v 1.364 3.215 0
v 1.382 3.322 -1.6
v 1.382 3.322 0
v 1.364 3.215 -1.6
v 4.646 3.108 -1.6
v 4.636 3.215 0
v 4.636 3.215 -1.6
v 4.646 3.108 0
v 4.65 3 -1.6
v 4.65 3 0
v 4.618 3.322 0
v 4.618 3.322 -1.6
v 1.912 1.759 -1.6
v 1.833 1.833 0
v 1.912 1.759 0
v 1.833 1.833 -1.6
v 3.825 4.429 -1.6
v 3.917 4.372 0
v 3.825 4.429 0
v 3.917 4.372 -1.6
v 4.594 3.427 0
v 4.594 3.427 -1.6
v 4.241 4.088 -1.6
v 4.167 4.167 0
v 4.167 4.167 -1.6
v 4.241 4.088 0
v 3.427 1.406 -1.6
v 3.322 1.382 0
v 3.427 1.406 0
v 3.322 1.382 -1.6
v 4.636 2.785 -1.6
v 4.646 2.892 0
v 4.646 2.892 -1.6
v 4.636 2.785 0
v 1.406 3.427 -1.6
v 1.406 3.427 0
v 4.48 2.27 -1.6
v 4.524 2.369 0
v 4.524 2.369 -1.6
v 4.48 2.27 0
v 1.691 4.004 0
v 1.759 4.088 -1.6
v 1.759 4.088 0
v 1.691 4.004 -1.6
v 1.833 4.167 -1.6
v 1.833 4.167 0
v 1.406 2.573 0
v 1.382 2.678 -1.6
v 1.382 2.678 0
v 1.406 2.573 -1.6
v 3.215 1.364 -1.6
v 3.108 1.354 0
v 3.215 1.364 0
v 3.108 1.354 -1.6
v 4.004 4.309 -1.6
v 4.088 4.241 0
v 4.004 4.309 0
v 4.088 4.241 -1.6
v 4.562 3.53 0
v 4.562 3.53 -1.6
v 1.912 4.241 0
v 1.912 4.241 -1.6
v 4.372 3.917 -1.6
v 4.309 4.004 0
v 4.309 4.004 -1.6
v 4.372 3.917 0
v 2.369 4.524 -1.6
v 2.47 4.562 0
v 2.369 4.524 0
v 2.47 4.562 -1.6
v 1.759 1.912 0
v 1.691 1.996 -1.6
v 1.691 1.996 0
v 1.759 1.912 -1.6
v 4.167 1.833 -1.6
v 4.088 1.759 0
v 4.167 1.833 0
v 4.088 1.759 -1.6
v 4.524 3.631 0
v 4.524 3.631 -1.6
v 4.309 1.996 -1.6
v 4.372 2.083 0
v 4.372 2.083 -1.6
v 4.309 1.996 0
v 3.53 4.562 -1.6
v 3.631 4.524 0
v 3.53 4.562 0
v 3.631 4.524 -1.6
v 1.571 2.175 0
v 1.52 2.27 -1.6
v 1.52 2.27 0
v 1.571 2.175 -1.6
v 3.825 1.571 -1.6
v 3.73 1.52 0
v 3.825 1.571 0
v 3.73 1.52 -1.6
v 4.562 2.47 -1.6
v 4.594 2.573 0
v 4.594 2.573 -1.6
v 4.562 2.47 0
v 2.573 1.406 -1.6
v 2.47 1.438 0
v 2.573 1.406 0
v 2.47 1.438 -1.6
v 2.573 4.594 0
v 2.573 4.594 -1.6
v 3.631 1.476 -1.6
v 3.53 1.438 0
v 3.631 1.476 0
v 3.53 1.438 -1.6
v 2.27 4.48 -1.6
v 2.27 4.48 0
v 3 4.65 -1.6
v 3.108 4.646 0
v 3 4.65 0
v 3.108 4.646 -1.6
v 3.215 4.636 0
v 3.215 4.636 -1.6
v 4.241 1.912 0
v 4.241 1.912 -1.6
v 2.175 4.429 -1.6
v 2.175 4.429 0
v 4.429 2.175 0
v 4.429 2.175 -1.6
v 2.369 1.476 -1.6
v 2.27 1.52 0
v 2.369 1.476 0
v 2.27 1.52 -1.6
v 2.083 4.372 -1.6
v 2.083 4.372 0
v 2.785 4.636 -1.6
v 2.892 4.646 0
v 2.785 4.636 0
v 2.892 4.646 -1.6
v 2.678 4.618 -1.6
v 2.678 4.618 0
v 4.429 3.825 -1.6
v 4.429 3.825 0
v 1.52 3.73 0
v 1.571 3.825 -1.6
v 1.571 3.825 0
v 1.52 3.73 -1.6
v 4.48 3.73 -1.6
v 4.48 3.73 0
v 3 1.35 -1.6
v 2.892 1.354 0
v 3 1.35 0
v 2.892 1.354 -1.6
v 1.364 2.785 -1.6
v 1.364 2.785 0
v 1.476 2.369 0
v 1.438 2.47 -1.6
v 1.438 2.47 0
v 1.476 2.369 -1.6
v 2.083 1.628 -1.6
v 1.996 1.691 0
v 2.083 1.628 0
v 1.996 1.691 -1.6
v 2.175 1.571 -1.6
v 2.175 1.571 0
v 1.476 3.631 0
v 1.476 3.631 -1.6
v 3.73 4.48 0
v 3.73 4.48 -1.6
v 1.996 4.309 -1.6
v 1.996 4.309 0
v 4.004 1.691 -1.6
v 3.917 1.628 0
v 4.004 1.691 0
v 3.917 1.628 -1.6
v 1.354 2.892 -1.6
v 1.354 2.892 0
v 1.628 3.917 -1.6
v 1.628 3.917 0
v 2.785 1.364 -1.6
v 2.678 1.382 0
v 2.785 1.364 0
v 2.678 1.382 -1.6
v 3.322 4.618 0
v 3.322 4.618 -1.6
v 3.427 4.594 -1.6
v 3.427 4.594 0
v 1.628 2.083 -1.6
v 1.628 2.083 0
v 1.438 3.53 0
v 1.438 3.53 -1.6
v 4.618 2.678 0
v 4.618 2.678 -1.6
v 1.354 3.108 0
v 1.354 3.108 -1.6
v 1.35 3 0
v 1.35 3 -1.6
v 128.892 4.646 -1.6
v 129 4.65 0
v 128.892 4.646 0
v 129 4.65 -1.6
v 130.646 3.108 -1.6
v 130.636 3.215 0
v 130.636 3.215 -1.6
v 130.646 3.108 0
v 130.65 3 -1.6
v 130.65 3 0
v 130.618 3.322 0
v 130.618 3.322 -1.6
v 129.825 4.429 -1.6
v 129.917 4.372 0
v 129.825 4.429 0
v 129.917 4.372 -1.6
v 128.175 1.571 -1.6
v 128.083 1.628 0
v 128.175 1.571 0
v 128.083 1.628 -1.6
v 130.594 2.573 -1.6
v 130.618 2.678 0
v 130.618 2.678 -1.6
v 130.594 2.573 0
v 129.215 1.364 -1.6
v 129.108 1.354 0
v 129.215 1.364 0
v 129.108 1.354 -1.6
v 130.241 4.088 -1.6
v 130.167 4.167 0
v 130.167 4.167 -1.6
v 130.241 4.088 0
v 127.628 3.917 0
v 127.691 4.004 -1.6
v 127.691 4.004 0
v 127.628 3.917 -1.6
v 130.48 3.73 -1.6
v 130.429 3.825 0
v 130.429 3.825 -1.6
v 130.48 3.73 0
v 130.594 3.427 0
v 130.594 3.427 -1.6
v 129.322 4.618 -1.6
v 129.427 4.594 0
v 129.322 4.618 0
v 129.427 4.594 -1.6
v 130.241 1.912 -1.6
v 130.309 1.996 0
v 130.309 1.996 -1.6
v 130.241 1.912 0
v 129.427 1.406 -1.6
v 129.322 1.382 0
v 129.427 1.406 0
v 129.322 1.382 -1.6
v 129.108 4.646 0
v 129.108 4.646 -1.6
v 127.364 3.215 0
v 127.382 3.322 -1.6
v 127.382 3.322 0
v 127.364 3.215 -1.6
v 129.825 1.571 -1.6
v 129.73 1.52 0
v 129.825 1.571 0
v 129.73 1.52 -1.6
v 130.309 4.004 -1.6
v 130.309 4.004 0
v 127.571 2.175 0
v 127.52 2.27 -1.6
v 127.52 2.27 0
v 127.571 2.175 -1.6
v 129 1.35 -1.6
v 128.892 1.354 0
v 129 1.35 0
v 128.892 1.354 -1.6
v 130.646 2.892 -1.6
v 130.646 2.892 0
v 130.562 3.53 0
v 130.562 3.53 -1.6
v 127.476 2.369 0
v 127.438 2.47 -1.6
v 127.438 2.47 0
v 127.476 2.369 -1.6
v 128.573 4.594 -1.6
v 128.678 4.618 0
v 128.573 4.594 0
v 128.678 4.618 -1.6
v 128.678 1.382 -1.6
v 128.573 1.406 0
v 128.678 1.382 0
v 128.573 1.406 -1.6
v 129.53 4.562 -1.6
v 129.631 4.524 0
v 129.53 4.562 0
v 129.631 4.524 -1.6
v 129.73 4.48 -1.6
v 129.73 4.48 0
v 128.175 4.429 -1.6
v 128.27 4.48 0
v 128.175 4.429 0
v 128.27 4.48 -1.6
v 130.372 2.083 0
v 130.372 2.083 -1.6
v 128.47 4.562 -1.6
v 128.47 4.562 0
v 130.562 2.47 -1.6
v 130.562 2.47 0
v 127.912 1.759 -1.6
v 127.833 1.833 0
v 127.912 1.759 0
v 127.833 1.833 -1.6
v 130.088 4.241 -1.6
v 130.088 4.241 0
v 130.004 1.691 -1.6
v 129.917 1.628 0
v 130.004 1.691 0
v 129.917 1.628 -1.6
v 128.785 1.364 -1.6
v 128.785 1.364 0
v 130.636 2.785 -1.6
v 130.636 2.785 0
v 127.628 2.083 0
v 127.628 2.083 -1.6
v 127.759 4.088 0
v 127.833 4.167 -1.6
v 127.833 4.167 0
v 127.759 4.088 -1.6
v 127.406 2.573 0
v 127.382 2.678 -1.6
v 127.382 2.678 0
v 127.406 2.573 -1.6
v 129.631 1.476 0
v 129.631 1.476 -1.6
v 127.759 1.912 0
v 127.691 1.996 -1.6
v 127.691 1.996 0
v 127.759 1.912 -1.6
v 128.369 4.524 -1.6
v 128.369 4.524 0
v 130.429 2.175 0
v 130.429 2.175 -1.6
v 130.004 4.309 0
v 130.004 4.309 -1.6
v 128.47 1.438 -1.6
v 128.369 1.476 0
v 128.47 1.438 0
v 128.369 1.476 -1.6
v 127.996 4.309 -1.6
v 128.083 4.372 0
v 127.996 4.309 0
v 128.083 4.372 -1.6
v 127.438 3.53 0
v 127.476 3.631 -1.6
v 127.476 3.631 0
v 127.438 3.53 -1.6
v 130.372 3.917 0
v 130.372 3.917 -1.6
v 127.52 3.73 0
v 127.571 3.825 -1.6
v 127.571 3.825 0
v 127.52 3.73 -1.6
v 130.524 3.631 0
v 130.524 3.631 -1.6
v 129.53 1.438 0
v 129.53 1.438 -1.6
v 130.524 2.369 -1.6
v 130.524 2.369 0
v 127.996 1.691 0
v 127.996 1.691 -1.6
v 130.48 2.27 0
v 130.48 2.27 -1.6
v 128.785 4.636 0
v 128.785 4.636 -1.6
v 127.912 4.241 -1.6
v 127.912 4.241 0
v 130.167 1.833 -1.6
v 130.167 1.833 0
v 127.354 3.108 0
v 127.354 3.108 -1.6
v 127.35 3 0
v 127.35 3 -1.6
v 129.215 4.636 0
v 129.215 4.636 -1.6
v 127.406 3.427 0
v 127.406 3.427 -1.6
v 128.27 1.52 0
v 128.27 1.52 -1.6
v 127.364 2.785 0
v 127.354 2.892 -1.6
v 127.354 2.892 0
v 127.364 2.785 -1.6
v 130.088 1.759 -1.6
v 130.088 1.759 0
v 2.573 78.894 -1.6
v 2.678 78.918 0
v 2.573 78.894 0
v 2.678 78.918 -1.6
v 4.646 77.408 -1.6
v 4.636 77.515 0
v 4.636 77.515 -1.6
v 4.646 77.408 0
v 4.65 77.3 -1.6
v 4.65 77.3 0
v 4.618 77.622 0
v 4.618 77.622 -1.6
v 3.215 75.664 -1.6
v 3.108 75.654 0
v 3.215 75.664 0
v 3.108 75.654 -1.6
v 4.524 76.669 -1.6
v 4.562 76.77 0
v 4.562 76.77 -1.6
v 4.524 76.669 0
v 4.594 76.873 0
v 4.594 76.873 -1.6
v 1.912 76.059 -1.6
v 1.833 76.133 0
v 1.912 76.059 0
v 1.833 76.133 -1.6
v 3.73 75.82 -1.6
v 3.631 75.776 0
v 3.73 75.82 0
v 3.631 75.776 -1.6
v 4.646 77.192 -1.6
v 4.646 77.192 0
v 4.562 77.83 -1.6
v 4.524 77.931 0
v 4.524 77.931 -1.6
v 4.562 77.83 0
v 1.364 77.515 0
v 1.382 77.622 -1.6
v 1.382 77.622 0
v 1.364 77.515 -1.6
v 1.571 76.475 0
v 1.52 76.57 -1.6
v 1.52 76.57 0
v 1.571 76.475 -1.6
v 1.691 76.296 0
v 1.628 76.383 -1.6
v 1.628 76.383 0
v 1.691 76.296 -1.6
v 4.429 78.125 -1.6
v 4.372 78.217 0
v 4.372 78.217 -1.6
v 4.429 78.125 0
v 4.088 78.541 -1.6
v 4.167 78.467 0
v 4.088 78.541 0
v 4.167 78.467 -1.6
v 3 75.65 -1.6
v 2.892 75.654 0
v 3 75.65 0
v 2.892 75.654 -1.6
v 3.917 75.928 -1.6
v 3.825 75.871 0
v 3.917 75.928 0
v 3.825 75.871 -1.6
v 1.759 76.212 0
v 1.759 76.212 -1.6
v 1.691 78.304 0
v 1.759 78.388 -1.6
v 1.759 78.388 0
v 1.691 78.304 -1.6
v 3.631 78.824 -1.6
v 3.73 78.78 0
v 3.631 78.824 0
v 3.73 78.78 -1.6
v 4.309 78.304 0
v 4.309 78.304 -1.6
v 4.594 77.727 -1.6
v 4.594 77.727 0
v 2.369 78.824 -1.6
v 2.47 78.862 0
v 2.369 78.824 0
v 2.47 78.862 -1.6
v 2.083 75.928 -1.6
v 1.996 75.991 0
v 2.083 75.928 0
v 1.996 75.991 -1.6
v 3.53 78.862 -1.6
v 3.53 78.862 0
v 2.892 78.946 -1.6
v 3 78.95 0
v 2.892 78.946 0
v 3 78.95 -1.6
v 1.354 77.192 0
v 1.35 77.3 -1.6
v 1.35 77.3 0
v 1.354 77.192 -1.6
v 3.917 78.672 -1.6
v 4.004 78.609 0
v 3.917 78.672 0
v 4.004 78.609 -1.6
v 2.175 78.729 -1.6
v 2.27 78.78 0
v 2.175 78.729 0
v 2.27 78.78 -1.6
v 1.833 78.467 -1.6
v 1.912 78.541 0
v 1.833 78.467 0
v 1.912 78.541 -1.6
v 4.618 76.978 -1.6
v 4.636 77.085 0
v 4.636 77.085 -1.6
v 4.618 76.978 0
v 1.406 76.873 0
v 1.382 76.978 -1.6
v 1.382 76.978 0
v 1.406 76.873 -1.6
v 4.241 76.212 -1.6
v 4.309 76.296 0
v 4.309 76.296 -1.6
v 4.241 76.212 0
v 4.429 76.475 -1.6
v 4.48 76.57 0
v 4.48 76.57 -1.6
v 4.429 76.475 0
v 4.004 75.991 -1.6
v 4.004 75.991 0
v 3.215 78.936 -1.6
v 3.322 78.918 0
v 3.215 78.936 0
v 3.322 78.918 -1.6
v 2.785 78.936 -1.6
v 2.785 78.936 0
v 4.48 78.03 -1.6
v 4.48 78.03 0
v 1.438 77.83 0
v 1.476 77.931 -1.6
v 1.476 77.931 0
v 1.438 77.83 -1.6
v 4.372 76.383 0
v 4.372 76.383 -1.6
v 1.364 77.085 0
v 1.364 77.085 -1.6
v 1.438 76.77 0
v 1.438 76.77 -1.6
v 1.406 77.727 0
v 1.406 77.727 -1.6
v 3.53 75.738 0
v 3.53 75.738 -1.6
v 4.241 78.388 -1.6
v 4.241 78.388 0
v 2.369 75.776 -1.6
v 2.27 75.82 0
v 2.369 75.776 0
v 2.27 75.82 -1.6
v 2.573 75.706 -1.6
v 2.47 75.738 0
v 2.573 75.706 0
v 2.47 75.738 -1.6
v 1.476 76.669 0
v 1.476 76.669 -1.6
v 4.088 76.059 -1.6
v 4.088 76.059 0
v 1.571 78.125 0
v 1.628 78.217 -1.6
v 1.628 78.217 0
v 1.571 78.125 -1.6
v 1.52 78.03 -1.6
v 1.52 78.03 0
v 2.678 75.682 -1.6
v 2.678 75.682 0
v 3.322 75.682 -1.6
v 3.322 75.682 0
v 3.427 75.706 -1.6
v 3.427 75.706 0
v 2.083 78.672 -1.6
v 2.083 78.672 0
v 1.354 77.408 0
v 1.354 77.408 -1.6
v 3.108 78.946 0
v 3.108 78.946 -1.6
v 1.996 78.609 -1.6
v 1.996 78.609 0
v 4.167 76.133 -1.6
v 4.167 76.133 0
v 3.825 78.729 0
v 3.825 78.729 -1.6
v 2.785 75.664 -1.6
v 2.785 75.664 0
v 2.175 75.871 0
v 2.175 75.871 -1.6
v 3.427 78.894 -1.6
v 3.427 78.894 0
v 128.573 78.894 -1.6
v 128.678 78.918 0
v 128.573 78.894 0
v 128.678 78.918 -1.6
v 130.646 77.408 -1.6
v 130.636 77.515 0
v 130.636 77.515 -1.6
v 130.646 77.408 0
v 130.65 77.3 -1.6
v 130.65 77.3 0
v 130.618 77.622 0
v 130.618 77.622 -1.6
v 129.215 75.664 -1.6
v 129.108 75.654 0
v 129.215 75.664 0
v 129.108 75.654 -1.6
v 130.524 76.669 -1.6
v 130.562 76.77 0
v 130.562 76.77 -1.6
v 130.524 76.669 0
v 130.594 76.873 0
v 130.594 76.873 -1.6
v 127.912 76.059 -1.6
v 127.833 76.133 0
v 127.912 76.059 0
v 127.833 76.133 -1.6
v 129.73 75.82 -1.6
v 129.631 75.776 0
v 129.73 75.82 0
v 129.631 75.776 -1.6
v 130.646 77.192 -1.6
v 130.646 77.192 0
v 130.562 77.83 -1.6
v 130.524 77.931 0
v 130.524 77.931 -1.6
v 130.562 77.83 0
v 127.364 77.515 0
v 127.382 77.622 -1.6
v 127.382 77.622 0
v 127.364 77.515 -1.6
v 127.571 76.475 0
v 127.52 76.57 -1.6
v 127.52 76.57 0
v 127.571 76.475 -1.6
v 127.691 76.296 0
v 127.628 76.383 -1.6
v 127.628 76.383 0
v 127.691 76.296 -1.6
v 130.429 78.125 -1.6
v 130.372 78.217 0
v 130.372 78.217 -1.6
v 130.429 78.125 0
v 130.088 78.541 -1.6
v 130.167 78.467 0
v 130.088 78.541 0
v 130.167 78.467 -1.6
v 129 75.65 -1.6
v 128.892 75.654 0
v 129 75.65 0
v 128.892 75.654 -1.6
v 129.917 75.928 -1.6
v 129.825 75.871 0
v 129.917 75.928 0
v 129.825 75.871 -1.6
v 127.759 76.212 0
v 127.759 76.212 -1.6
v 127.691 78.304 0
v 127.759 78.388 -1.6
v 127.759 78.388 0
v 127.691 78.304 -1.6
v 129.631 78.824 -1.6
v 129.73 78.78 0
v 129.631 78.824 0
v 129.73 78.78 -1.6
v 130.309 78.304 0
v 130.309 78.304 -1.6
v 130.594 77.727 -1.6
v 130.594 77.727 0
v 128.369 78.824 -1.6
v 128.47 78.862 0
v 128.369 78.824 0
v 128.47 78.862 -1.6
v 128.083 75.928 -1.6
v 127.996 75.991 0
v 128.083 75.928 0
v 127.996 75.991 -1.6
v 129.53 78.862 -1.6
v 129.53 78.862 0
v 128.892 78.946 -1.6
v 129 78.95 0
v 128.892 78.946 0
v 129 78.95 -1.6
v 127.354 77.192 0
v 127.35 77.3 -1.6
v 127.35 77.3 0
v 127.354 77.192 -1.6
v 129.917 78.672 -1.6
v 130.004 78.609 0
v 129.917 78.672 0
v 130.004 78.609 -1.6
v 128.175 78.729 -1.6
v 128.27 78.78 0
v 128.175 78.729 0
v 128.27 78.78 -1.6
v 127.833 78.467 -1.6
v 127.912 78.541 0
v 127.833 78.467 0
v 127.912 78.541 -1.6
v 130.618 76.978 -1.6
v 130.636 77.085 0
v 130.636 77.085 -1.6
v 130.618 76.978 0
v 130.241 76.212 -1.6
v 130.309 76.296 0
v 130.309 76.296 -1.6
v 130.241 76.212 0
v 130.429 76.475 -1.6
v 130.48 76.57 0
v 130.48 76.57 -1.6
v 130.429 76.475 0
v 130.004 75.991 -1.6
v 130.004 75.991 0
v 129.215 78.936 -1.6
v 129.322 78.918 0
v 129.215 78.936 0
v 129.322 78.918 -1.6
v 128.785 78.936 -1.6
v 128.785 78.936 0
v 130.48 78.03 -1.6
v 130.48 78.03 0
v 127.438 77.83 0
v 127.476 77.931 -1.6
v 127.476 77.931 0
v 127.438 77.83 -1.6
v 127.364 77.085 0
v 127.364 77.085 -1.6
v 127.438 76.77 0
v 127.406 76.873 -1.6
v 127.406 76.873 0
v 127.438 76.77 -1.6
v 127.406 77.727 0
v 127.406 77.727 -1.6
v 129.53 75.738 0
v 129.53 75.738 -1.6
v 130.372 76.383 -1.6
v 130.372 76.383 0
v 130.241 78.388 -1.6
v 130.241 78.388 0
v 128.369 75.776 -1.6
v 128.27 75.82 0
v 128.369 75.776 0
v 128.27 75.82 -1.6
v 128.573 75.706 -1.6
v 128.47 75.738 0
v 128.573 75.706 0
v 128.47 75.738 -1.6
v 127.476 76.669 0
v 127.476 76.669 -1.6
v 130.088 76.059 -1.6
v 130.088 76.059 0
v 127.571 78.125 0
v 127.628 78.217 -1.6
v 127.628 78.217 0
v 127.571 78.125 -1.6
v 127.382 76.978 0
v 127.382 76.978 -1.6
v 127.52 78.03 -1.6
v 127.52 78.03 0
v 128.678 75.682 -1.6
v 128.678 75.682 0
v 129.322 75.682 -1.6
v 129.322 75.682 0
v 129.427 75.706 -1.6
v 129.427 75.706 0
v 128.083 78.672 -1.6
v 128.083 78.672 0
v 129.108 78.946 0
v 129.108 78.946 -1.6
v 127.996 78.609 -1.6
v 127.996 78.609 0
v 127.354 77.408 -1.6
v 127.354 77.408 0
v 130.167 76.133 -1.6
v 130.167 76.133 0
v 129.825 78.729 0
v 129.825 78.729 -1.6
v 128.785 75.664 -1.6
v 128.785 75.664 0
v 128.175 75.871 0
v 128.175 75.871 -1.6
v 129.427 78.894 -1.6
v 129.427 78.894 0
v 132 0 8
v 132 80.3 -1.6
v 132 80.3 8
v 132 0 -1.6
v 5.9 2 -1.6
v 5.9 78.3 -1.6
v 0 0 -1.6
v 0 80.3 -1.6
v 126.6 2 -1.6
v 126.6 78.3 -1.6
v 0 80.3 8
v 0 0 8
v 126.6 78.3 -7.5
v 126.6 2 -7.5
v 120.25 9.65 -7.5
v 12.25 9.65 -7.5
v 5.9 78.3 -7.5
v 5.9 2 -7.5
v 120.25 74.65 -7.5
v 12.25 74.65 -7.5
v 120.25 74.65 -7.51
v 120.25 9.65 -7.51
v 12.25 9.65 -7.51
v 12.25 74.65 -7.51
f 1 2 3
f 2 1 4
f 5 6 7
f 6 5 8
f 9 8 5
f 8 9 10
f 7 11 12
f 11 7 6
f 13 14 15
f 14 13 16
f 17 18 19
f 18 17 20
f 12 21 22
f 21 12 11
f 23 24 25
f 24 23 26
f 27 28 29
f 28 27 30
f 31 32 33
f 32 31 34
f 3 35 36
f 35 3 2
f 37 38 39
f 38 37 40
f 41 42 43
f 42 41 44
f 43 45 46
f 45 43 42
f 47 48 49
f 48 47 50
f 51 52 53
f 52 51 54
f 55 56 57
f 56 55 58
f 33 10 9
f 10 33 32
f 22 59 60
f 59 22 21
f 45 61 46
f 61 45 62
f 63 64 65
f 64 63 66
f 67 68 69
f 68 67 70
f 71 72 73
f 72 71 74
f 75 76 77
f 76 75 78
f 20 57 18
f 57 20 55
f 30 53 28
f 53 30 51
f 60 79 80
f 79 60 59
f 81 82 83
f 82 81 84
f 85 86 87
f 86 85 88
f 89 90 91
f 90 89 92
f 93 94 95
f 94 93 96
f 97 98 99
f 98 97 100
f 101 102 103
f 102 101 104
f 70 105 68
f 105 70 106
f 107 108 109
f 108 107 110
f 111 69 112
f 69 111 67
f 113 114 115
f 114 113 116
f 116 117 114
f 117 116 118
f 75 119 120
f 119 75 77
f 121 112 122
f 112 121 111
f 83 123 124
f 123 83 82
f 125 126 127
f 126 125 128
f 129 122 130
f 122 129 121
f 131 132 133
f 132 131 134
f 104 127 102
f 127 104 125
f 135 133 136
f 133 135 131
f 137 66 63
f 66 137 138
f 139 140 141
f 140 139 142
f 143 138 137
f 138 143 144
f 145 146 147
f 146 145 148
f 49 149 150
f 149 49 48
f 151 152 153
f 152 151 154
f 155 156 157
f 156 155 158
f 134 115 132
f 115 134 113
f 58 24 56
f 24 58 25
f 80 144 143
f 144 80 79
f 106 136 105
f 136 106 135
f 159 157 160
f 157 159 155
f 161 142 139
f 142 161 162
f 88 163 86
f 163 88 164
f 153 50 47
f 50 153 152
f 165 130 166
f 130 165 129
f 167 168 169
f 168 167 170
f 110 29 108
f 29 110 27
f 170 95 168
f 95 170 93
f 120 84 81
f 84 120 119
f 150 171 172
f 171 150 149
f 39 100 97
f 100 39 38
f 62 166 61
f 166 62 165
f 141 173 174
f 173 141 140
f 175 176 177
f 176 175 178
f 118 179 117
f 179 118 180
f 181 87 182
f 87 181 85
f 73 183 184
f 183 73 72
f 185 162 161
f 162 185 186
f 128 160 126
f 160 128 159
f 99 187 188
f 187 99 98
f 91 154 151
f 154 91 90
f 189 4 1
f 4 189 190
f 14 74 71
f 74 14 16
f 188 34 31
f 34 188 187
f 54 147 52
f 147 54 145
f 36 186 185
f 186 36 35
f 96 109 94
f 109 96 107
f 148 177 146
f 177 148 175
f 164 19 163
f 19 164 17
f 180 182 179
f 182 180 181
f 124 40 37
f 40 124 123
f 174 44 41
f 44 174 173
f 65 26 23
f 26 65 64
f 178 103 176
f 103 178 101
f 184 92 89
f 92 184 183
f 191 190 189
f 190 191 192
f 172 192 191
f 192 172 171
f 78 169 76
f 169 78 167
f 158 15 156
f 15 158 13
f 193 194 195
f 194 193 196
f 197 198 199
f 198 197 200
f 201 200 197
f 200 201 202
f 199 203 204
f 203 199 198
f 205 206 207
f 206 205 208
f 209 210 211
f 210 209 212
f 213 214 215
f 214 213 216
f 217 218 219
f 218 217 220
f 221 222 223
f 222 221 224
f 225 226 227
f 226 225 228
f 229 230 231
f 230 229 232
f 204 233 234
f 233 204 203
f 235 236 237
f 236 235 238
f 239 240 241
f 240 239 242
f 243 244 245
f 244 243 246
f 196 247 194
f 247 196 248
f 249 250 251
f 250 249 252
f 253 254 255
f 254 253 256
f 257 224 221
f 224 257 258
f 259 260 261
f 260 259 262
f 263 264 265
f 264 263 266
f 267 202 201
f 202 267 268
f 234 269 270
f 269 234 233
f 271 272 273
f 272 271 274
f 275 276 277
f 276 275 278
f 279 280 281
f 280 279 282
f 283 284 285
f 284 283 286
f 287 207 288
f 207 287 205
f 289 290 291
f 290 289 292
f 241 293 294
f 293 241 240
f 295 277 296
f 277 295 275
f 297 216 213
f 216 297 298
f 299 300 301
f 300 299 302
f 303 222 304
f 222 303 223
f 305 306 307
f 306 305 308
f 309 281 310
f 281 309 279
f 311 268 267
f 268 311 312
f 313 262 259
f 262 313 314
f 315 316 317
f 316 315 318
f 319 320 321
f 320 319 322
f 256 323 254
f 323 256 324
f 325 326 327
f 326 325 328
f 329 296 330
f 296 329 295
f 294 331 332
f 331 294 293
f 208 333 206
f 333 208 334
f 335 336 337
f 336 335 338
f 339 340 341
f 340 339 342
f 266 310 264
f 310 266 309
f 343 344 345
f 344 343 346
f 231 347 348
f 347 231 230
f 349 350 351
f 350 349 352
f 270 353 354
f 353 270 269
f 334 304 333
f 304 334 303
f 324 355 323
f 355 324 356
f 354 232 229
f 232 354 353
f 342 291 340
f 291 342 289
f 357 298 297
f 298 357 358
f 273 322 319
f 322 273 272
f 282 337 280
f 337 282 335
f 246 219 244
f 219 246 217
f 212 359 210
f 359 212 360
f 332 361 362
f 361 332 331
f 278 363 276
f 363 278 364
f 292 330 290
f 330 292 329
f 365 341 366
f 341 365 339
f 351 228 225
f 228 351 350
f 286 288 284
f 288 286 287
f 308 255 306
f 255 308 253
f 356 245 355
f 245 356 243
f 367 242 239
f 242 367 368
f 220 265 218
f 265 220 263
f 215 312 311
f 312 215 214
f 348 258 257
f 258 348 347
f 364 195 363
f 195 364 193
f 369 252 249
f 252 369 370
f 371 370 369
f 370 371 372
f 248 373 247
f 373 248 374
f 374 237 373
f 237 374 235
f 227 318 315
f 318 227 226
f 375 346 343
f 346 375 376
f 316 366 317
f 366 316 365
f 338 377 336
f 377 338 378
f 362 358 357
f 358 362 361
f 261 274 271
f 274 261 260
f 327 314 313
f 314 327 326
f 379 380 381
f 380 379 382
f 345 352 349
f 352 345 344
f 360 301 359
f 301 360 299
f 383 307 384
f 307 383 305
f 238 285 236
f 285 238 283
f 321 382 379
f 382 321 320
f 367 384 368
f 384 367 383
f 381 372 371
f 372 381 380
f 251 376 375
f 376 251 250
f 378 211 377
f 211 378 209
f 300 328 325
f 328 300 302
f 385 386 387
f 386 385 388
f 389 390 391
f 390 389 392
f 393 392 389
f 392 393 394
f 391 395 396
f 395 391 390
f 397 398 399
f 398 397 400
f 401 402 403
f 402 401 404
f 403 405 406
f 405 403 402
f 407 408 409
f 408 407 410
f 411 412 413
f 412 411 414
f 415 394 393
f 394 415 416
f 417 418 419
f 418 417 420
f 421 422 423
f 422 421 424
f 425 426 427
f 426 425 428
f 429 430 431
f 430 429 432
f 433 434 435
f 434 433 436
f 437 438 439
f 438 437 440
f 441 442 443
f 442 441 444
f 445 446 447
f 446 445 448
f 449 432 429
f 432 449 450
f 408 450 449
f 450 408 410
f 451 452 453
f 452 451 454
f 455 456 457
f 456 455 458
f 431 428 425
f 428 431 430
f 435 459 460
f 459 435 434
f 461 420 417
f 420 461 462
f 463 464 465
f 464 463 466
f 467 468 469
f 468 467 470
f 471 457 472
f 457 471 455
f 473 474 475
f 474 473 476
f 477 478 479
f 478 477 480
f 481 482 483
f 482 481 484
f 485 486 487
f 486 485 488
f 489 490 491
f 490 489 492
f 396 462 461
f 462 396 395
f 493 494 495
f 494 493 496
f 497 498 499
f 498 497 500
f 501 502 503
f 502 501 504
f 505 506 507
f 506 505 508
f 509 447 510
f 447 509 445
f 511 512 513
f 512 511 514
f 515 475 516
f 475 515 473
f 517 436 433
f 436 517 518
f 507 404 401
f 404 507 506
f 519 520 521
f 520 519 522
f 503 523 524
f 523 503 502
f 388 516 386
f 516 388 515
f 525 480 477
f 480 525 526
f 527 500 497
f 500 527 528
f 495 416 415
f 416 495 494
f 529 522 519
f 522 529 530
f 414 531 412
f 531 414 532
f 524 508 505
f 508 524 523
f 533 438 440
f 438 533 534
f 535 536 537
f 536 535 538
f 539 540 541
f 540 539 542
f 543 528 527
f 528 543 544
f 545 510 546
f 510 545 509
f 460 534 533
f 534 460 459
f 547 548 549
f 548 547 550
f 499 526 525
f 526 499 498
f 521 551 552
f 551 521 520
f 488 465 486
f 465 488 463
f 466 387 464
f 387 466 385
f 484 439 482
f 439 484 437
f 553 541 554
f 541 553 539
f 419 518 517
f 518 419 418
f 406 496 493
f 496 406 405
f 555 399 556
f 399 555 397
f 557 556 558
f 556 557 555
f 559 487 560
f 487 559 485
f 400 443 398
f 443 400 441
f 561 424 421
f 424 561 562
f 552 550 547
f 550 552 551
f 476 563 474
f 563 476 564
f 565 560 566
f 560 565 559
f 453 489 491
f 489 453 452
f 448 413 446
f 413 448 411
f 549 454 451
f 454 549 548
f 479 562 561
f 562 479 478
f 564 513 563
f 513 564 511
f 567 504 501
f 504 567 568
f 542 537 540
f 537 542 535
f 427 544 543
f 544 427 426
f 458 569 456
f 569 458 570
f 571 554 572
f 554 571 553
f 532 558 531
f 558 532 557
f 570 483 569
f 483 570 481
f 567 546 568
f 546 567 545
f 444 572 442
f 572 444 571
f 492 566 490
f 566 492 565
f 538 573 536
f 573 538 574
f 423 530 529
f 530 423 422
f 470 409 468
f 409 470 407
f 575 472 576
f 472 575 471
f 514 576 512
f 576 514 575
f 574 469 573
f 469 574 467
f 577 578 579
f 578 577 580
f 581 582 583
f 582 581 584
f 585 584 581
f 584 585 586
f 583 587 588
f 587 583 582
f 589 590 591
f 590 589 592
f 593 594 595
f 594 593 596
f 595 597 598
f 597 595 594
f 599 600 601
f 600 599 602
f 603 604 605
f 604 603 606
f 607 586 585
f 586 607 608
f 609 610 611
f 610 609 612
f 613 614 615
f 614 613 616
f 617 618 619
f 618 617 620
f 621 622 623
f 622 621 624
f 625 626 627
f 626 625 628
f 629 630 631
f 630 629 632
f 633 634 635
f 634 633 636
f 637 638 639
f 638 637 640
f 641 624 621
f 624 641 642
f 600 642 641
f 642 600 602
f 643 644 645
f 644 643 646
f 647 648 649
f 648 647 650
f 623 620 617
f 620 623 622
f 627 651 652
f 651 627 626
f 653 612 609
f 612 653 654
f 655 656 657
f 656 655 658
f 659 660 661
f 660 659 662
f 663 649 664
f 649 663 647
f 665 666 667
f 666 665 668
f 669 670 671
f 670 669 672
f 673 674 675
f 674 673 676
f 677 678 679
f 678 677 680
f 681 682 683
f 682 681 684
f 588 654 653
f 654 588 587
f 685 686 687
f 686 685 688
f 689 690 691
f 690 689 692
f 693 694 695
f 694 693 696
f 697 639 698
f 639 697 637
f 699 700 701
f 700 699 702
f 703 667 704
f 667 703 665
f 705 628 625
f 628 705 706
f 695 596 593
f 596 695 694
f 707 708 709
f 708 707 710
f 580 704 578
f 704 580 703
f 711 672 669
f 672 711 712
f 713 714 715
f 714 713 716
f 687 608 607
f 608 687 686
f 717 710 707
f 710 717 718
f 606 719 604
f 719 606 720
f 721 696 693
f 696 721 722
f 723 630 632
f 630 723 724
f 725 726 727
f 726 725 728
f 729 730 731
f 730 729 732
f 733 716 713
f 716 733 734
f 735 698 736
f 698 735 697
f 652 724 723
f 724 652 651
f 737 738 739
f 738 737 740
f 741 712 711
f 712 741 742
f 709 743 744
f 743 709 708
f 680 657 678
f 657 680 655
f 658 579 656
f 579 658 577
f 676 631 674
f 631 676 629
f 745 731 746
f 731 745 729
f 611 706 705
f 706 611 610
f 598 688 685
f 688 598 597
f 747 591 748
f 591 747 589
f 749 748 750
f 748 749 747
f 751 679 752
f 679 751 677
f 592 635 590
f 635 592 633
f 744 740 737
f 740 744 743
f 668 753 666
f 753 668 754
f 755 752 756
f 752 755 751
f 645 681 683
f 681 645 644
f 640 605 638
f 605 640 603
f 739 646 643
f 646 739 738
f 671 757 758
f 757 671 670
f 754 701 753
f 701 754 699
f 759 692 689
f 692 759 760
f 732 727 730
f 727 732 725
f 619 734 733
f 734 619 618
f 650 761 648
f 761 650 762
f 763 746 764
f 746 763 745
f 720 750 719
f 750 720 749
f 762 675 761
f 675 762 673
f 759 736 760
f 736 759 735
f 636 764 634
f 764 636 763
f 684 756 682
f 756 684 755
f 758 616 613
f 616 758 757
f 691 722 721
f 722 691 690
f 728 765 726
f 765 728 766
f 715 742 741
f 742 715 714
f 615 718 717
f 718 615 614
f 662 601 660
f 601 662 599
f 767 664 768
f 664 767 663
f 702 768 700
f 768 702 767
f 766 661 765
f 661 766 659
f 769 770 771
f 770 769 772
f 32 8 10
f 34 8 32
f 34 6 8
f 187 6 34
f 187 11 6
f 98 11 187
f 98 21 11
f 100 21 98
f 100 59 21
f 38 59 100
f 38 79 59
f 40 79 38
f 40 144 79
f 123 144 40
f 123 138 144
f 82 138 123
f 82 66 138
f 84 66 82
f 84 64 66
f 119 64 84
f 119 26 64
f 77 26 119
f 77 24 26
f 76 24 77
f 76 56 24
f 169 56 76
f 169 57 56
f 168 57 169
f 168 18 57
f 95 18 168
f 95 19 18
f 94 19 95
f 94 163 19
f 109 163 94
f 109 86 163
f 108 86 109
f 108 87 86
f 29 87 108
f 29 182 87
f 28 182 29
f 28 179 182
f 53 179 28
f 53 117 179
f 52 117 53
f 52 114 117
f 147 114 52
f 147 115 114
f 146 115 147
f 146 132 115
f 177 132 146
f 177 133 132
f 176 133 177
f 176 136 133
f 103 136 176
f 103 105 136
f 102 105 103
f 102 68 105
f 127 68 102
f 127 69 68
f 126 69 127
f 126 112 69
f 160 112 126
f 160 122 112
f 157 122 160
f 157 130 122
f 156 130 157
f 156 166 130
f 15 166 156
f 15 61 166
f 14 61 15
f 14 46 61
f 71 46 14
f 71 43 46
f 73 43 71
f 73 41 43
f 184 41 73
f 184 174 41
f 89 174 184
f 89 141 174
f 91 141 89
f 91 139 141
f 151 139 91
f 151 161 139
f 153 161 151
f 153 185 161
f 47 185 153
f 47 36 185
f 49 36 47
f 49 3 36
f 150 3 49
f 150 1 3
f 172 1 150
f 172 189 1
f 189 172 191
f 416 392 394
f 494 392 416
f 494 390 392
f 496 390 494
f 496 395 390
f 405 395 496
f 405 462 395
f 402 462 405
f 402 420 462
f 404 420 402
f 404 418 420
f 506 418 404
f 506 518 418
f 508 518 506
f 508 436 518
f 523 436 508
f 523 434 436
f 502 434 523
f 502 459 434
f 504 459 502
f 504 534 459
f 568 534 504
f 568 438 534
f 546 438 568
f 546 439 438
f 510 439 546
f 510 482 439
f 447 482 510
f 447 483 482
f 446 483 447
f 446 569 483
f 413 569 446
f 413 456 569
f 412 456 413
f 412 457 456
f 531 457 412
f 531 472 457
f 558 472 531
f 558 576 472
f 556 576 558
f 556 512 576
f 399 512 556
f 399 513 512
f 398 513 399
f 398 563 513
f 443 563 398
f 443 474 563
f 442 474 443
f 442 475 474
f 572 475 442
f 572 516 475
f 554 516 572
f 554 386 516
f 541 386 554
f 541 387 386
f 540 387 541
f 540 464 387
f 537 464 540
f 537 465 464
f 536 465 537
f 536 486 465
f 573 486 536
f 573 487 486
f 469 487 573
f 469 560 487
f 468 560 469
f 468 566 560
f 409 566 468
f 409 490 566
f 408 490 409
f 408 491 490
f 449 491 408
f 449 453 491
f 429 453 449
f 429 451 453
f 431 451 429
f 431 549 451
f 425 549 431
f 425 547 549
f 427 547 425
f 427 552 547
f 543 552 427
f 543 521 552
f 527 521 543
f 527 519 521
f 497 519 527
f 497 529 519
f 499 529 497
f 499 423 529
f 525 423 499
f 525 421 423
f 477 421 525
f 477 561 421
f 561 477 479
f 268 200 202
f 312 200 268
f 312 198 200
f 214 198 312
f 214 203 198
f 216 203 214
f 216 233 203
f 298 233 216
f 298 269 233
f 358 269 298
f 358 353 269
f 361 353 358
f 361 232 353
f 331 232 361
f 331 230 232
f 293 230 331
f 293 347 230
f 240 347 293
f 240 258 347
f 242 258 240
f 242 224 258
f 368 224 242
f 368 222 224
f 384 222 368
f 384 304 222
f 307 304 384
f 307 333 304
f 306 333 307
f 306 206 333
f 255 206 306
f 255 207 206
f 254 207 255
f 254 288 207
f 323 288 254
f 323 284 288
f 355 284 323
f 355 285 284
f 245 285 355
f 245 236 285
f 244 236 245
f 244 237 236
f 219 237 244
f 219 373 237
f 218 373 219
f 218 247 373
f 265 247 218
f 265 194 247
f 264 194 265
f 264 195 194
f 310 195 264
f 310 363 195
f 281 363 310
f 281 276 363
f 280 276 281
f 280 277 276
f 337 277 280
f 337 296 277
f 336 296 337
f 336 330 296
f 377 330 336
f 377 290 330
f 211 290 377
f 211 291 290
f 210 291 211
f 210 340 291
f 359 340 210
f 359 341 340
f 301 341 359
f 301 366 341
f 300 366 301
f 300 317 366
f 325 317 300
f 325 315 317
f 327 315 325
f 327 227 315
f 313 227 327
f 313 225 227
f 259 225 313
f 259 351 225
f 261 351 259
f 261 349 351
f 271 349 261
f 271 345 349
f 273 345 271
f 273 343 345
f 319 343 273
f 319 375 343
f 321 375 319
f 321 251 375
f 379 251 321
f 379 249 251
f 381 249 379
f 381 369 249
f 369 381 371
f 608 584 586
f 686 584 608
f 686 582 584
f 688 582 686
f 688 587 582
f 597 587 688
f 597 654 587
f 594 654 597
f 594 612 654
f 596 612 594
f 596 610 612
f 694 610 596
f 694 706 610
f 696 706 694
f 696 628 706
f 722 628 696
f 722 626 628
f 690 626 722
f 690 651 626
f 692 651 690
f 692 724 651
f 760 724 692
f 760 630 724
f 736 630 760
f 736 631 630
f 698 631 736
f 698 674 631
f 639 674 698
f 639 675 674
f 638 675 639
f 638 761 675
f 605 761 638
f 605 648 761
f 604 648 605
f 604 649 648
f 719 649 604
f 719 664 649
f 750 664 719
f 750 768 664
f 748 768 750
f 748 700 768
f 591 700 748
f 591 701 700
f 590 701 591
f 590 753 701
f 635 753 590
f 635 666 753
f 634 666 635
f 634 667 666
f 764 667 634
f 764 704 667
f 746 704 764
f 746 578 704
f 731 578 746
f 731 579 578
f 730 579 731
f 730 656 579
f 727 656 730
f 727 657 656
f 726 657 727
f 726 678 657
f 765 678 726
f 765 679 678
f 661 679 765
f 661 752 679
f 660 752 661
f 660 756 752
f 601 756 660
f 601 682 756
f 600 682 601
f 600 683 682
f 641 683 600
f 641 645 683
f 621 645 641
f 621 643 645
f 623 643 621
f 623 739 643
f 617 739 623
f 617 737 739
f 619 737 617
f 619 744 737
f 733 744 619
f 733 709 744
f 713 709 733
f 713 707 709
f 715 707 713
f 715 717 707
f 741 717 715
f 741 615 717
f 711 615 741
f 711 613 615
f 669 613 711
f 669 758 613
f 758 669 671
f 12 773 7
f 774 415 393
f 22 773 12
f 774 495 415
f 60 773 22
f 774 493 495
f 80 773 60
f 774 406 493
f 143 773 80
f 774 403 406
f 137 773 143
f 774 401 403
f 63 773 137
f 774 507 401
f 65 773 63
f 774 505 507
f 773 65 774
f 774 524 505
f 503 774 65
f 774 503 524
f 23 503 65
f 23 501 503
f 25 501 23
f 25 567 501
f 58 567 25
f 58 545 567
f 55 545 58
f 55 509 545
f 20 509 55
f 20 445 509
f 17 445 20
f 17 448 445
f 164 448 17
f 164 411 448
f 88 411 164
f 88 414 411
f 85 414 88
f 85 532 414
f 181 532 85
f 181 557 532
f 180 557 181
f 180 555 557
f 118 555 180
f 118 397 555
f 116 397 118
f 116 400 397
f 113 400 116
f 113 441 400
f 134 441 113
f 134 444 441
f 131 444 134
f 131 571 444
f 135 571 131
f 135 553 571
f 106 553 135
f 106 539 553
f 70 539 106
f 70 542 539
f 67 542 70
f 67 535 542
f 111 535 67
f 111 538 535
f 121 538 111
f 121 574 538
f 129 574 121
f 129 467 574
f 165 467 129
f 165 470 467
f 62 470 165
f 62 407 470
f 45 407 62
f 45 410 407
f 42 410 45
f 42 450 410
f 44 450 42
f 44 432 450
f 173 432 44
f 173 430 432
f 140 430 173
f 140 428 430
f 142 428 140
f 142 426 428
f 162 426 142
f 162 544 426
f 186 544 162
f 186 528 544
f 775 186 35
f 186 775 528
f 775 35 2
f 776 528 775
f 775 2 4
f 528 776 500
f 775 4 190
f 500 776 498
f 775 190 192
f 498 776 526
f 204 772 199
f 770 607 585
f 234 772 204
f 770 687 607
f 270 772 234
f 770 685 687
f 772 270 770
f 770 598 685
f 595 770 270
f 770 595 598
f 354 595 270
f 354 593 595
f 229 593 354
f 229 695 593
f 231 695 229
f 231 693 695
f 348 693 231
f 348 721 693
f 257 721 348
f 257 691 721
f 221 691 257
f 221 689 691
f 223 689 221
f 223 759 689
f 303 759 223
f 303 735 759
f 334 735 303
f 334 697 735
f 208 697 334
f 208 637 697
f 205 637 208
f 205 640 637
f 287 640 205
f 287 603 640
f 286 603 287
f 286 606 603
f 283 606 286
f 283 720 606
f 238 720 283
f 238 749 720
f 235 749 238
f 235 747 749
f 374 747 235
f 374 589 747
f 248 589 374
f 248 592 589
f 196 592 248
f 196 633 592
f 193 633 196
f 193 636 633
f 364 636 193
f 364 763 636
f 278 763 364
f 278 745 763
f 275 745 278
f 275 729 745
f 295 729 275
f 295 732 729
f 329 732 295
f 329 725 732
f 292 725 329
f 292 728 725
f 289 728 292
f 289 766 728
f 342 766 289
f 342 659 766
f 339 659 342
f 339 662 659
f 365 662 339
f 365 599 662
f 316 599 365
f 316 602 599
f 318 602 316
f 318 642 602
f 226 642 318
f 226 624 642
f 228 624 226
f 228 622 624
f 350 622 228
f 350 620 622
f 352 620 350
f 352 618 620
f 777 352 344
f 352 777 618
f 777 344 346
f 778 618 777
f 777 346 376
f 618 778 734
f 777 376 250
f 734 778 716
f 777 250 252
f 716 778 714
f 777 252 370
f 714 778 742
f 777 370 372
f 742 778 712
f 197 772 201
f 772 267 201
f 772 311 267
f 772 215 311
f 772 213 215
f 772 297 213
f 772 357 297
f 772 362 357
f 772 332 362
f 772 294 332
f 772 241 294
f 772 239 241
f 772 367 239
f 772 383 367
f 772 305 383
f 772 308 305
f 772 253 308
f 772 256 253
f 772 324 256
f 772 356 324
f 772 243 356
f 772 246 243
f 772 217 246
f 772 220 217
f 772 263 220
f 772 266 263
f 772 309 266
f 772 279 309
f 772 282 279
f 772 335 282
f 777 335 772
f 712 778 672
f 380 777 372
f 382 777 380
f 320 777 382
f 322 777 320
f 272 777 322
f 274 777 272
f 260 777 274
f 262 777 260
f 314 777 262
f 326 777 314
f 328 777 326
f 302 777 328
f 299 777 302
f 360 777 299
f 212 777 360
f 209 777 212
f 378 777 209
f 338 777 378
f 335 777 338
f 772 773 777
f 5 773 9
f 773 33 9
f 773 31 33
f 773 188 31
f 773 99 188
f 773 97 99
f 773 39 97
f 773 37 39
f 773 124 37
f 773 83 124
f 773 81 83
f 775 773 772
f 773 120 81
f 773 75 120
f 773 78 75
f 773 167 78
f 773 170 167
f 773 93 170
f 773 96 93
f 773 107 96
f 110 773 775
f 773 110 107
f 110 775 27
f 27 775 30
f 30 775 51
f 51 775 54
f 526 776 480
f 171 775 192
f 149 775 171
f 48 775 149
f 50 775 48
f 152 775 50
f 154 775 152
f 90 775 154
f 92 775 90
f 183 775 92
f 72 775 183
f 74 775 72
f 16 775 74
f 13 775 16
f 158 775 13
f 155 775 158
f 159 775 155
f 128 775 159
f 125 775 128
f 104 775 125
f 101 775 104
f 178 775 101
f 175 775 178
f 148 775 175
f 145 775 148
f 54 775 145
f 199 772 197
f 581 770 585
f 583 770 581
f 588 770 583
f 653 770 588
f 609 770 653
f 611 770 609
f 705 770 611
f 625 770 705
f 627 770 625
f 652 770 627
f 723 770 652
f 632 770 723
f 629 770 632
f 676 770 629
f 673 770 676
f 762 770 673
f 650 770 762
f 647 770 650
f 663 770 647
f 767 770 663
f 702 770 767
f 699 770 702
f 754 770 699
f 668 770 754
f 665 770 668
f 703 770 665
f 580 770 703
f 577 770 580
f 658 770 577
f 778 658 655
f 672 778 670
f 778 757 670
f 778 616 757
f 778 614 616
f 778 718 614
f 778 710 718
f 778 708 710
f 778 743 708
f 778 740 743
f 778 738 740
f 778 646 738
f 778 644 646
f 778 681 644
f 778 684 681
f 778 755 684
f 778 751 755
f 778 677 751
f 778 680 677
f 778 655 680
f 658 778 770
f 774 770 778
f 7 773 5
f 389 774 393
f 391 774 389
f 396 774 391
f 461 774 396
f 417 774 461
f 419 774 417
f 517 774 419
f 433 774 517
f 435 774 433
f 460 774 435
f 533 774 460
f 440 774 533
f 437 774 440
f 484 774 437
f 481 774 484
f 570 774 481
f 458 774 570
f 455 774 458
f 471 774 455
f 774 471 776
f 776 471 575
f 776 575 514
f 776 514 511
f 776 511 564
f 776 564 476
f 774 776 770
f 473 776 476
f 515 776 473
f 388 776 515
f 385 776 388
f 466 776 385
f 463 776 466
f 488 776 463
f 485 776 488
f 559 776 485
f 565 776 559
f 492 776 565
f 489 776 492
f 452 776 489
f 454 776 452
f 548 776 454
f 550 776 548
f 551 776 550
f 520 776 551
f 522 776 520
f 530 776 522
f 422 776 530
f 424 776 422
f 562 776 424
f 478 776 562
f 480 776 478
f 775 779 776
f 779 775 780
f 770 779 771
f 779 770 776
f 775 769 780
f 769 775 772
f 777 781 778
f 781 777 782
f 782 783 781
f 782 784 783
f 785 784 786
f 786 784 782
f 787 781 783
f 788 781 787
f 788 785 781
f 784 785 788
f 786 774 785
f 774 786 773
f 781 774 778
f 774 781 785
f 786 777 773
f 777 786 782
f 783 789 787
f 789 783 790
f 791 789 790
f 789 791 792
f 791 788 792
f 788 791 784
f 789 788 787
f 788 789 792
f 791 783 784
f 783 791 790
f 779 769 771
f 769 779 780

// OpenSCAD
// CrowPanel Advanced 5" ESP32-P4 (Elecrow DHE04005D) - simple model for fit checks (not printed).
// Dimensions: params.scad, cp5_* (taken from Elecrow's STEP model, 2026-11-26).
// Origin = a corner of the board's BACK face; X along the long side; screen faces -Z (see params.scad).
// Seen from the front, X is mirrored: the USB-C edge is on the left.
//
// Version 1.0.1 - created 2026-11-26, last modified 2026-11-26
// History:
//   1.0.1  2026-11-26  Pixel area drawn at its measured size and position (cp5_active_c).
//   1.0.0  2026-11-26  First version: board, LCD, pixel area, holes, back keep-out, edge features.
include <../params.scad>

module crowpanel_p4_5in(camera = false, keepout = true) {
    // board with its 4 holes
    color("darkgreen") difference() {
        translate([0, 0, -cp5_board[2]])
            cube(cp5_board);
        for (h = cp5_holes)
            translate([h[0], h[1], -cp5_board[2] - 1]) cylinder(d = cp5_hole_d, h = cp5_board[2] + 2);
    }
    // LCD module on the front, with the (estimated) pixel area
    color("black")
        translate([cp5_lcd_xy[0], cp5_lcd_xy[1], -cp5_board[2] - cp5_lcd[2]]) cube(cp5_lcd);
    color("royalblue")
        translate([cp5_active_c[0] - cp5_active[0] / 2, cp5_active_c[1] - cp5_active[1] / 2, -cp5_board[2] - cp5_lcd[2] - 0.01])
            cube([cp5_active[0], cp5_active[1], 0.01]);
    // back: everything stays inside this block
    if (keepout)
        color("gray", 0.25) translate([0, 0, 0]) cube([cp5_board[0], cp5_board[1], cp5_back_h]);
    // edge features
    color("silver") for (u = cp5_usbc) translate(u) cube(cp5_usbc_sz);
    color("white") for (b = cp5_buttons) translate(b) cube(cp5_button_sz);
    color("silver") for (e = cp5_edge_x0) translate([e[0], e[1], e[2]]) cube([e[3], e[4], e[5]]);
    color("white") translate([cp5_conn_r[0], cp5_conn_r[1], cp5_conn_r[2]])
        cube([cp5_conn_r[3], cp5_conn_r[4], cp5_conn_r[5]]);
    color("tan") translate([cp5_cam_conn[0], cp5_cam_conn[1], cp5_cam_conn[2]])
        cube([cp5_cam_conn[3], cp5_cam_conn[4], cp5_cam_conn[5]]);
    if (camera)
        color("orange") translate([cp5_cam[0], cp5_cam[1], cp5_cam[2]]) cube([cp5_cam[3], cp5_cam[4], cp5_cam[5]]);
}

crowpanel_p4_5in();
